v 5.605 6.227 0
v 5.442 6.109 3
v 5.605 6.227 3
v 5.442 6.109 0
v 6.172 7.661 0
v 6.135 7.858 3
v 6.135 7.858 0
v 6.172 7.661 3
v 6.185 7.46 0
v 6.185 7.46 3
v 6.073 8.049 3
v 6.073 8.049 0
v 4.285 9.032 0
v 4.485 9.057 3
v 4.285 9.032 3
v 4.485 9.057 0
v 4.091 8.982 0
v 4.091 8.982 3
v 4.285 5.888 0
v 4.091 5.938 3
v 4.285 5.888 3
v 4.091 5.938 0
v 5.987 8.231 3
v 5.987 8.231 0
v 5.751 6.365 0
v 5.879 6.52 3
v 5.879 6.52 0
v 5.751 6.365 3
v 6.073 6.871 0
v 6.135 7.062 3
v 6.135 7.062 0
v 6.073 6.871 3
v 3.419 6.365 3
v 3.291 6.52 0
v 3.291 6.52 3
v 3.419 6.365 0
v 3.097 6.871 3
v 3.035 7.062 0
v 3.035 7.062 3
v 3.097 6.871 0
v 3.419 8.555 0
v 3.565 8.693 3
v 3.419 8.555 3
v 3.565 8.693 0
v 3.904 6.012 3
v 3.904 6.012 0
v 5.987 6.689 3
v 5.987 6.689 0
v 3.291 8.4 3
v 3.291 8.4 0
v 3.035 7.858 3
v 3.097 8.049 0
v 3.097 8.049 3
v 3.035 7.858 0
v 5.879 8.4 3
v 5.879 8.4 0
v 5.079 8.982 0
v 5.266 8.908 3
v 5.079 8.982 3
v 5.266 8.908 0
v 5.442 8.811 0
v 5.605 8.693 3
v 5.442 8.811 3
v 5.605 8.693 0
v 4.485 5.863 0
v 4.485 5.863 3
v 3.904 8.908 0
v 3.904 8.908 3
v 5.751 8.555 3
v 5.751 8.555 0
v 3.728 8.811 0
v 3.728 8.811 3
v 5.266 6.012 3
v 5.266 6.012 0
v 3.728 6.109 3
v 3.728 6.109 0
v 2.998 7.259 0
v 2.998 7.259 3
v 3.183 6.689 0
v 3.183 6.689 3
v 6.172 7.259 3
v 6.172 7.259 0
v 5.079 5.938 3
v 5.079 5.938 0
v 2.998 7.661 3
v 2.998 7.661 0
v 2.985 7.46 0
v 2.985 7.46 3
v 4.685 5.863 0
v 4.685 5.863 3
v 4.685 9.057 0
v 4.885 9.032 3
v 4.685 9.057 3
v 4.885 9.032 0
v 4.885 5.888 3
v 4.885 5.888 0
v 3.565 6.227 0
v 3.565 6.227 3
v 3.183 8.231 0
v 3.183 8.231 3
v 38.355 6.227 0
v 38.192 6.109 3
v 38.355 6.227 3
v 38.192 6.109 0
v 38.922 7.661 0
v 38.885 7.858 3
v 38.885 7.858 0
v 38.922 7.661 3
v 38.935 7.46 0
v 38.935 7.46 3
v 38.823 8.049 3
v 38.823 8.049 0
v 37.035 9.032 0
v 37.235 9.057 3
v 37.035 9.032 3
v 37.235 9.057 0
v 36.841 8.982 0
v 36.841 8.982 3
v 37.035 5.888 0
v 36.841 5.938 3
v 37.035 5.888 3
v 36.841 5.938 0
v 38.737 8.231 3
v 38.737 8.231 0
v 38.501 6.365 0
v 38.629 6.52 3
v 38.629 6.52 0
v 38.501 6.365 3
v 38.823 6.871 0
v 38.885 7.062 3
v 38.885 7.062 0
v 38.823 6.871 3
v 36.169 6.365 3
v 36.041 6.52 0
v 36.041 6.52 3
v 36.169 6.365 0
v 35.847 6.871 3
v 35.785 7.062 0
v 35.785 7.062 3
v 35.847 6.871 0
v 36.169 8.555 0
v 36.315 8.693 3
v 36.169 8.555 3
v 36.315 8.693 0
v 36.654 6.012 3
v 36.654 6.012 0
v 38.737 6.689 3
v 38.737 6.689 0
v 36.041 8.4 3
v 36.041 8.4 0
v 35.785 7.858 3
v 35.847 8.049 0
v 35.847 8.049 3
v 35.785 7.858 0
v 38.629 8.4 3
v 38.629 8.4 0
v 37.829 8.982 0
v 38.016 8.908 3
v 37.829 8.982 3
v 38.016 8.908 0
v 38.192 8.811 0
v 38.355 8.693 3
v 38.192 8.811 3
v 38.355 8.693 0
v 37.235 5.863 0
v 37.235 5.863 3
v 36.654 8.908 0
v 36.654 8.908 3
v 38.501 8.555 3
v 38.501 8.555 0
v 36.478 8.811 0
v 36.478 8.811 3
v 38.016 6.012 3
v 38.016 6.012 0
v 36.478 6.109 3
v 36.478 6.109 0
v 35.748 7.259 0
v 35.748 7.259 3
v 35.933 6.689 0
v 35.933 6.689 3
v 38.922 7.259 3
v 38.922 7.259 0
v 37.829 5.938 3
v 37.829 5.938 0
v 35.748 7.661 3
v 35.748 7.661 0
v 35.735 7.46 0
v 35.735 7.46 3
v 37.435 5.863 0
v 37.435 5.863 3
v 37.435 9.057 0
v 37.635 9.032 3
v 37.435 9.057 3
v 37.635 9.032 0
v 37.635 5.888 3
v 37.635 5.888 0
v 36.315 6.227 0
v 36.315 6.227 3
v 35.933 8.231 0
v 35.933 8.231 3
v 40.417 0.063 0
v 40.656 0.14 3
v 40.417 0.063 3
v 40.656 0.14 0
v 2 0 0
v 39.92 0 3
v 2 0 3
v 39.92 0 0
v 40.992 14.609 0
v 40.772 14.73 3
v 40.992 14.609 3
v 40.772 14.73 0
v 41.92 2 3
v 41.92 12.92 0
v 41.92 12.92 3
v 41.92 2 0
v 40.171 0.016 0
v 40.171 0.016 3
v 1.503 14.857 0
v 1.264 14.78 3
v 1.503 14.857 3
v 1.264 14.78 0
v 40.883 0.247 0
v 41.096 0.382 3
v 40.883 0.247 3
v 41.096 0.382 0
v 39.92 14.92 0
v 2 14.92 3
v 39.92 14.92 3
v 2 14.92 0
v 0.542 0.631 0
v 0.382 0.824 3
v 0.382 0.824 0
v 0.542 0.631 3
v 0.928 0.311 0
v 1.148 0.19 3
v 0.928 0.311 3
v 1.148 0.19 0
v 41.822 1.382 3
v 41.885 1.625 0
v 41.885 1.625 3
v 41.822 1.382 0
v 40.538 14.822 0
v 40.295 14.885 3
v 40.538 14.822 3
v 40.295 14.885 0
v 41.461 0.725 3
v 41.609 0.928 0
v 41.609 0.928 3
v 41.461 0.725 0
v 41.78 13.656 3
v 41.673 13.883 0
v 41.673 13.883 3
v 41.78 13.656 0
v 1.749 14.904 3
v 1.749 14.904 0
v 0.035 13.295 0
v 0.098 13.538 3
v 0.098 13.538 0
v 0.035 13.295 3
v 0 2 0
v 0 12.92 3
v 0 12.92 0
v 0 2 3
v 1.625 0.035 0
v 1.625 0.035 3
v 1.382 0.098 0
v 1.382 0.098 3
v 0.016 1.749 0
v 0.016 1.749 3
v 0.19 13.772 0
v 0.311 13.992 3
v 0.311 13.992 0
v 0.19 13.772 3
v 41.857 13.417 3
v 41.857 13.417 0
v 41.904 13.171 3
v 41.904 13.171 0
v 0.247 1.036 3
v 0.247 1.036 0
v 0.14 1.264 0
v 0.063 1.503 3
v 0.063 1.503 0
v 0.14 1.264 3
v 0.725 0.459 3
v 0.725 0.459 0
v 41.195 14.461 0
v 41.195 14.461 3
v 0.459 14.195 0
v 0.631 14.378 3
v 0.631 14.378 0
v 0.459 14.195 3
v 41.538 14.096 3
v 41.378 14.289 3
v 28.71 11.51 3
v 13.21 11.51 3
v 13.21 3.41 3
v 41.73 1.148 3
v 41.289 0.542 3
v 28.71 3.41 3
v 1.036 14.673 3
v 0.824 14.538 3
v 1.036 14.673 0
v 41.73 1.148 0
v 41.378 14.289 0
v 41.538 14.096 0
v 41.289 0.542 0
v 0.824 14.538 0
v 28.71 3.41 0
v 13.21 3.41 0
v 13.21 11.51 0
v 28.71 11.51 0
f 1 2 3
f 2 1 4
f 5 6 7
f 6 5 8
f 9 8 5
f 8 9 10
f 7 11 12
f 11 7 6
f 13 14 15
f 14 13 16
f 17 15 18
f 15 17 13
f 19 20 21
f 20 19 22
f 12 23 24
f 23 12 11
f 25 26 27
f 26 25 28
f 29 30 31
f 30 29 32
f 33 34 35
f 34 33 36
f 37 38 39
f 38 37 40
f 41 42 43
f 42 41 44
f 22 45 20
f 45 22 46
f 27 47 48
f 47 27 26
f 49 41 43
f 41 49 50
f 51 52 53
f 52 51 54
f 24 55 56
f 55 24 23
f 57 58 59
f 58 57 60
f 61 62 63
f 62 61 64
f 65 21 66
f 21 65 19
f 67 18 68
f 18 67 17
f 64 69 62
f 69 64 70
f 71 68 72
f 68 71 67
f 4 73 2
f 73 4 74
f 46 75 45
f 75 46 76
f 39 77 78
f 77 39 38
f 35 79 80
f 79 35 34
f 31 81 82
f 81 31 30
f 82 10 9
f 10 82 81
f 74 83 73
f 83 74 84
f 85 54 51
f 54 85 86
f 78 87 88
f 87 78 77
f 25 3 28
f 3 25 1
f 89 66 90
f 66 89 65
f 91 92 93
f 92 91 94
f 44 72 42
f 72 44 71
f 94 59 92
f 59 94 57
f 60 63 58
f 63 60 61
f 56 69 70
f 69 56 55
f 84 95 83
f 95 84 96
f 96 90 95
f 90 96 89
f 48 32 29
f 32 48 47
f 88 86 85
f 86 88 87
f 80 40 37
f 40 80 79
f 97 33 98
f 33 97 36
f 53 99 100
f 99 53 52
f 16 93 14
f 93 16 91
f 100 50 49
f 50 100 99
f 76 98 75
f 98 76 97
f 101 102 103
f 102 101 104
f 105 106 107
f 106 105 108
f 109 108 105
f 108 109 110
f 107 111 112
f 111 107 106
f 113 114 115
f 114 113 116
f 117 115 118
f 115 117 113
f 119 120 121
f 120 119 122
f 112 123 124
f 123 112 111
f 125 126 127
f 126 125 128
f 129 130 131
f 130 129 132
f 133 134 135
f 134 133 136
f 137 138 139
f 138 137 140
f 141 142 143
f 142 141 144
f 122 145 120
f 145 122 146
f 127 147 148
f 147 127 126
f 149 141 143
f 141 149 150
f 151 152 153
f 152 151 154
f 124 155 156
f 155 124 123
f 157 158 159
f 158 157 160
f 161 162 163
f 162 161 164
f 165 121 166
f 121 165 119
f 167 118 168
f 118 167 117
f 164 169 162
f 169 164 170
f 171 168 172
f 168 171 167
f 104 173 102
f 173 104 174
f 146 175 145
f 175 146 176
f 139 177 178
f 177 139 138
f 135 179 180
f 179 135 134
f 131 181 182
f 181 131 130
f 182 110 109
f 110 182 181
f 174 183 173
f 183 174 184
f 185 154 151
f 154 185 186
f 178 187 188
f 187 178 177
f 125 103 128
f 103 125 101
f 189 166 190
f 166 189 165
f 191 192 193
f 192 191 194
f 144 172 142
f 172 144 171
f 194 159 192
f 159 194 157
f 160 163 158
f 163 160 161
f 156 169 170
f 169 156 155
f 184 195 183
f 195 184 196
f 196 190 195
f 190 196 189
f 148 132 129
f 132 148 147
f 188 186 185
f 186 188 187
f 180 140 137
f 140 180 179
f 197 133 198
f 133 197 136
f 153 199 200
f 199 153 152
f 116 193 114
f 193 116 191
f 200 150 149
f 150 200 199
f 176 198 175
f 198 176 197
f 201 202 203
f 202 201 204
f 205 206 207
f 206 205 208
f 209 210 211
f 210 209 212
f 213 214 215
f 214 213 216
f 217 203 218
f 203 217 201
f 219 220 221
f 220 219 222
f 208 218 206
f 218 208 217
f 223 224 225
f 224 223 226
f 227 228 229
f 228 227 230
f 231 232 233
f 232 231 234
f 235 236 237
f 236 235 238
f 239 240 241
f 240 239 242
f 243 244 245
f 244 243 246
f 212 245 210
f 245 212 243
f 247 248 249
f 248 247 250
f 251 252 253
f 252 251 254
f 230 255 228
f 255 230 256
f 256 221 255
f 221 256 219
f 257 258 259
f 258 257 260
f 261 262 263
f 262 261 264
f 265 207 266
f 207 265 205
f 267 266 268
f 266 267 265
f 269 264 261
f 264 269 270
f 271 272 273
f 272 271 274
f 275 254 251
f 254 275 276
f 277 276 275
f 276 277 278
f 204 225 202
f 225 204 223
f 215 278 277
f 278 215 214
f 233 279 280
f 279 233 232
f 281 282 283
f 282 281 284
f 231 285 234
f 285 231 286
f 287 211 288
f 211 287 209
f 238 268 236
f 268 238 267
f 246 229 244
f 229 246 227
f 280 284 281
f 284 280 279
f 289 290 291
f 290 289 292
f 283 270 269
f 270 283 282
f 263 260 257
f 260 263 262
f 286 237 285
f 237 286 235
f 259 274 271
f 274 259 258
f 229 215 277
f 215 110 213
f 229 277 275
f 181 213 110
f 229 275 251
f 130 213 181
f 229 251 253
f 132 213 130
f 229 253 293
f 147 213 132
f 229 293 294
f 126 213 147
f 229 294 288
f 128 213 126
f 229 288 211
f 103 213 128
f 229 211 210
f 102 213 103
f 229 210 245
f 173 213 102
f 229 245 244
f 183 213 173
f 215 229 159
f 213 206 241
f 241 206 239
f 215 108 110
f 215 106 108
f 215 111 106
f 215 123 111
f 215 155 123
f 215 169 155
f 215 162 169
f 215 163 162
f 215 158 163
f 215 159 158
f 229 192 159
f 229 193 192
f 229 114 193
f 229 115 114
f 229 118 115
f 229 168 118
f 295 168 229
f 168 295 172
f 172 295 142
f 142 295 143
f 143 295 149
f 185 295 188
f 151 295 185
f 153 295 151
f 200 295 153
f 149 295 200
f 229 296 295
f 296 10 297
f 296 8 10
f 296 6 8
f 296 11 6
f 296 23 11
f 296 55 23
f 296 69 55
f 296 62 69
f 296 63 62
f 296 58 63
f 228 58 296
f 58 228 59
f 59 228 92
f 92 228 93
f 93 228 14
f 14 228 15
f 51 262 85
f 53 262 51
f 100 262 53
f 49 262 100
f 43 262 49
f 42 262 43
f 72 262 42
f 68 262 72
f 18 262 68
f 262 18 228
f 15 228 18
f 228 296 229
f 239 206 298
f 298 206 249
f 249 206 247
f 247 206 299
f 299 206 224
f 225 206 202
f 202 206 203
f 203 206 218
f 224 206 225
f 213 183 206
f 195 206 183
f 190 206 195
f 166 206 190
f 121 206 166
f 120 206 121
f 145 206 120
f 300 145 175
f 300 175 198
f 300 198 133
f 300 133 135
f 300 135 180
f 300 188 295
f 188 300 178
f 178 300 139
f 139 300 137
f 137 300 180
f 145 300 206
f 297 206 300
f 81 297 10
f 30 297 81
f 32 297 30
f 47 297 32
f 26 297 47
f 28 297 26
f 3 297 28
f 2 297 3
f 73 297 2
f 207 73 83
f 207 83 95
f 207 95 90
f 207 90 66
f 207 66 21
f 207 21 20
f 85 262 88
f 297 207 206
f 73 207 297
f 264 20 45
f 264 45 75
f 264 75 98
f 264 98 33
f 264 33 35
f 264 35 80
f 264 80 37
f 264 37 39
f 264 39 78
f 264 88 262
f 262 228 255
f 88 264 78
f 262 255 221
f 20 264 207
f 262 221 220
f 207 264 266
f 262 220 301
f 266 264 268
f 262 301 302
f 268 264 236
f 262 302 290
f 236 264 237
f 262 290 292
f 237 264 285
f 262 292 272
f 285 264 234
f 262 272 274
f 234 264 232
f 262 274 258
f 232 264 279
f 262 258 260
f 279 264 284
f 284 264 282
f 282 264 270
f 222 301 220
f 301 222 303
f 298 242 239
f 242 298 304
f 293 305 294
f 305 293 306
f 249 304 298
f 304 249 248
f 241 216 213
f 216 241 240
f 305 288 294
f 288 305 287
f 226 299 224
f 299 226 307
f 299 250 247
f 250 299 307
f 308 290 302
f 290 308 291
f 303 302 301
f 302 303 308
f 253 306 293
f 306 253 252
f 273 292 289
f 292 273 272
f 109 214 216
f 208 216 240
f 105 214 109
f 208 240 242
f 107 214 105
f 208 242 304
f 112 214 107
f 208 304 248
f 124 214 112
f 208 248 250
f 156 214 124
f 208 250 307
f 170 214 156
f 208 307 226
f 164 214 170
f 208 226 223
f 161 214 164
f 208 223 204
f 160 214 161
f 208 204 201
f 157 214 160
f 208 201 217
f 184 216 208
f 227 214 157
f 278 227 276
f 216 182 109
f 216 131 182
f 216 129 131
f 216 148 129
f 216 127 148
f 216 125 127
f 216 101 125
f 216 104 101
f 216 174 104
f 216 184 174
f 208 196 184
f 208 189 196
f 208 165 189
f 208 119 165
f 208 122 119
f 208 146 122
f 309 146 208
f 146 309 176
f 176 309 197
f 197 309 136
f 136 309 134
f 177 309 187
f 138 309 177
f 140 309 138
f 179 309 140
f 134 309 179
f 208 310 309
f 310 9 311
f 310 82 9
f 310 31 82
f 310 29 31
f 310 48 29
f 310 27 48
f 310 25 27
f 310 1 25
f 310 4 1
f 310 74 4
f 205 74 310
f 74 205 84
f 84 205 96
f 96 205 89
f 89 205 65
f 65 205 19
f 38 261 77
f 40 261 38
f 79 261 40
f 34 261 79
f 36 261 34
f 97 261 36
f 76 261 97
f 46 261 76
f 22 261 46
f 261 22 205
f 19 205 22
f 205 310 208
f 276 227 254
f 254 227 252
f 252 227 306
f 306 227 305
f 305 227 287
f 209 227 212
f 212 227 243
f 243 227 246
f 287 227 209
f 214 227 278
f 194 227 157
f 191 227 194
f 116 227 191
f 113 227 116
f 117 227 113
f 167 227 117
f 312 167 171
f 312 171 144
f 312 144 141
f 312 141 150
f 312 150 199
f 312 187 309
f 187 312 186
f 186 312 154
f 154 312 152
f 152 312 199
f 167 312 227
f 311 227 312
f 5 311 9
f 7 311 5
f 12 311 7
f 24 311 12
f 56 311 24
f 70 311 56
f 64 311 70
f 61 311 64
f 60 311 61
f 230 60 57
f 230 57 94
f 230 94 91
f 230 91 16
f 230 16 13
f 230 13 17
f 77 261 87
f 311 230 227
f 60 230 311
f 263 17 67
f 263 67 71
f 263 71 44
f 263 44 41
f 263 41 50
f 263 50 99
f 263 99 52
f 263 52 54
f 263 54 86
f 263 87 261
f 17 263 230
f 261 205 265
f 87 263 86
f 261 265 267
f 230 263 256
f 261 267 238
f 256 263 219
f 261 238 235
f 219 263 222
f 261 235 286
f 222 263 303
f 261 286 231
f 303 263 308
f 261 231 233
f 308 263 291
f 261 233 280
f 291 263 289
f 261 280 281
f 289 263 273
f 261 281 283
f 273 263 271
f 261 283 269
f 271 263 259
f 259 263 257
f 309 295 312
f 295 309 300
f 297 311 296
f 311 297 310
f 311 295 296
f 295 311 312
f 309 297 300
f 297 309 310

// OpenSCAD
// XT60 Male Connector Holder

$fn = 50;

// Base dimensions
base_x = 41.92;
base_y = 14.92;
base_z = 3;

// Mounting holes
hole_spacing = 32.75;  // center to center
hole_d = 3.2;          // M3 clearance

// XT60 cutout
xt60_x = 15.50;
xt60_y = 8.10;

// Corner radius
corner_r = 2;

difference() {
    // Base with rounded corners
    linear_extrude(base_z)
        offset(r=corner_r)
        offset(r=-corner_r)
        square([base_x, base_y]);

    // Mounting holes - centered along long side
    for (dx = [-1, 1]) {
        translate([base_x/2 + dx * hole_spacing/2, base_y/2, -0.1])
            cylinder(d=hole_d, h=base_z + 0.2);
    }

    // XT60 rectangular cutout - centered
    translate([(base_x - xt60_x)/2, (base_y - xt60_y)/2, -0.1])
        cube([xt60_x, xt60_y, base_z + 0.2]);
}
